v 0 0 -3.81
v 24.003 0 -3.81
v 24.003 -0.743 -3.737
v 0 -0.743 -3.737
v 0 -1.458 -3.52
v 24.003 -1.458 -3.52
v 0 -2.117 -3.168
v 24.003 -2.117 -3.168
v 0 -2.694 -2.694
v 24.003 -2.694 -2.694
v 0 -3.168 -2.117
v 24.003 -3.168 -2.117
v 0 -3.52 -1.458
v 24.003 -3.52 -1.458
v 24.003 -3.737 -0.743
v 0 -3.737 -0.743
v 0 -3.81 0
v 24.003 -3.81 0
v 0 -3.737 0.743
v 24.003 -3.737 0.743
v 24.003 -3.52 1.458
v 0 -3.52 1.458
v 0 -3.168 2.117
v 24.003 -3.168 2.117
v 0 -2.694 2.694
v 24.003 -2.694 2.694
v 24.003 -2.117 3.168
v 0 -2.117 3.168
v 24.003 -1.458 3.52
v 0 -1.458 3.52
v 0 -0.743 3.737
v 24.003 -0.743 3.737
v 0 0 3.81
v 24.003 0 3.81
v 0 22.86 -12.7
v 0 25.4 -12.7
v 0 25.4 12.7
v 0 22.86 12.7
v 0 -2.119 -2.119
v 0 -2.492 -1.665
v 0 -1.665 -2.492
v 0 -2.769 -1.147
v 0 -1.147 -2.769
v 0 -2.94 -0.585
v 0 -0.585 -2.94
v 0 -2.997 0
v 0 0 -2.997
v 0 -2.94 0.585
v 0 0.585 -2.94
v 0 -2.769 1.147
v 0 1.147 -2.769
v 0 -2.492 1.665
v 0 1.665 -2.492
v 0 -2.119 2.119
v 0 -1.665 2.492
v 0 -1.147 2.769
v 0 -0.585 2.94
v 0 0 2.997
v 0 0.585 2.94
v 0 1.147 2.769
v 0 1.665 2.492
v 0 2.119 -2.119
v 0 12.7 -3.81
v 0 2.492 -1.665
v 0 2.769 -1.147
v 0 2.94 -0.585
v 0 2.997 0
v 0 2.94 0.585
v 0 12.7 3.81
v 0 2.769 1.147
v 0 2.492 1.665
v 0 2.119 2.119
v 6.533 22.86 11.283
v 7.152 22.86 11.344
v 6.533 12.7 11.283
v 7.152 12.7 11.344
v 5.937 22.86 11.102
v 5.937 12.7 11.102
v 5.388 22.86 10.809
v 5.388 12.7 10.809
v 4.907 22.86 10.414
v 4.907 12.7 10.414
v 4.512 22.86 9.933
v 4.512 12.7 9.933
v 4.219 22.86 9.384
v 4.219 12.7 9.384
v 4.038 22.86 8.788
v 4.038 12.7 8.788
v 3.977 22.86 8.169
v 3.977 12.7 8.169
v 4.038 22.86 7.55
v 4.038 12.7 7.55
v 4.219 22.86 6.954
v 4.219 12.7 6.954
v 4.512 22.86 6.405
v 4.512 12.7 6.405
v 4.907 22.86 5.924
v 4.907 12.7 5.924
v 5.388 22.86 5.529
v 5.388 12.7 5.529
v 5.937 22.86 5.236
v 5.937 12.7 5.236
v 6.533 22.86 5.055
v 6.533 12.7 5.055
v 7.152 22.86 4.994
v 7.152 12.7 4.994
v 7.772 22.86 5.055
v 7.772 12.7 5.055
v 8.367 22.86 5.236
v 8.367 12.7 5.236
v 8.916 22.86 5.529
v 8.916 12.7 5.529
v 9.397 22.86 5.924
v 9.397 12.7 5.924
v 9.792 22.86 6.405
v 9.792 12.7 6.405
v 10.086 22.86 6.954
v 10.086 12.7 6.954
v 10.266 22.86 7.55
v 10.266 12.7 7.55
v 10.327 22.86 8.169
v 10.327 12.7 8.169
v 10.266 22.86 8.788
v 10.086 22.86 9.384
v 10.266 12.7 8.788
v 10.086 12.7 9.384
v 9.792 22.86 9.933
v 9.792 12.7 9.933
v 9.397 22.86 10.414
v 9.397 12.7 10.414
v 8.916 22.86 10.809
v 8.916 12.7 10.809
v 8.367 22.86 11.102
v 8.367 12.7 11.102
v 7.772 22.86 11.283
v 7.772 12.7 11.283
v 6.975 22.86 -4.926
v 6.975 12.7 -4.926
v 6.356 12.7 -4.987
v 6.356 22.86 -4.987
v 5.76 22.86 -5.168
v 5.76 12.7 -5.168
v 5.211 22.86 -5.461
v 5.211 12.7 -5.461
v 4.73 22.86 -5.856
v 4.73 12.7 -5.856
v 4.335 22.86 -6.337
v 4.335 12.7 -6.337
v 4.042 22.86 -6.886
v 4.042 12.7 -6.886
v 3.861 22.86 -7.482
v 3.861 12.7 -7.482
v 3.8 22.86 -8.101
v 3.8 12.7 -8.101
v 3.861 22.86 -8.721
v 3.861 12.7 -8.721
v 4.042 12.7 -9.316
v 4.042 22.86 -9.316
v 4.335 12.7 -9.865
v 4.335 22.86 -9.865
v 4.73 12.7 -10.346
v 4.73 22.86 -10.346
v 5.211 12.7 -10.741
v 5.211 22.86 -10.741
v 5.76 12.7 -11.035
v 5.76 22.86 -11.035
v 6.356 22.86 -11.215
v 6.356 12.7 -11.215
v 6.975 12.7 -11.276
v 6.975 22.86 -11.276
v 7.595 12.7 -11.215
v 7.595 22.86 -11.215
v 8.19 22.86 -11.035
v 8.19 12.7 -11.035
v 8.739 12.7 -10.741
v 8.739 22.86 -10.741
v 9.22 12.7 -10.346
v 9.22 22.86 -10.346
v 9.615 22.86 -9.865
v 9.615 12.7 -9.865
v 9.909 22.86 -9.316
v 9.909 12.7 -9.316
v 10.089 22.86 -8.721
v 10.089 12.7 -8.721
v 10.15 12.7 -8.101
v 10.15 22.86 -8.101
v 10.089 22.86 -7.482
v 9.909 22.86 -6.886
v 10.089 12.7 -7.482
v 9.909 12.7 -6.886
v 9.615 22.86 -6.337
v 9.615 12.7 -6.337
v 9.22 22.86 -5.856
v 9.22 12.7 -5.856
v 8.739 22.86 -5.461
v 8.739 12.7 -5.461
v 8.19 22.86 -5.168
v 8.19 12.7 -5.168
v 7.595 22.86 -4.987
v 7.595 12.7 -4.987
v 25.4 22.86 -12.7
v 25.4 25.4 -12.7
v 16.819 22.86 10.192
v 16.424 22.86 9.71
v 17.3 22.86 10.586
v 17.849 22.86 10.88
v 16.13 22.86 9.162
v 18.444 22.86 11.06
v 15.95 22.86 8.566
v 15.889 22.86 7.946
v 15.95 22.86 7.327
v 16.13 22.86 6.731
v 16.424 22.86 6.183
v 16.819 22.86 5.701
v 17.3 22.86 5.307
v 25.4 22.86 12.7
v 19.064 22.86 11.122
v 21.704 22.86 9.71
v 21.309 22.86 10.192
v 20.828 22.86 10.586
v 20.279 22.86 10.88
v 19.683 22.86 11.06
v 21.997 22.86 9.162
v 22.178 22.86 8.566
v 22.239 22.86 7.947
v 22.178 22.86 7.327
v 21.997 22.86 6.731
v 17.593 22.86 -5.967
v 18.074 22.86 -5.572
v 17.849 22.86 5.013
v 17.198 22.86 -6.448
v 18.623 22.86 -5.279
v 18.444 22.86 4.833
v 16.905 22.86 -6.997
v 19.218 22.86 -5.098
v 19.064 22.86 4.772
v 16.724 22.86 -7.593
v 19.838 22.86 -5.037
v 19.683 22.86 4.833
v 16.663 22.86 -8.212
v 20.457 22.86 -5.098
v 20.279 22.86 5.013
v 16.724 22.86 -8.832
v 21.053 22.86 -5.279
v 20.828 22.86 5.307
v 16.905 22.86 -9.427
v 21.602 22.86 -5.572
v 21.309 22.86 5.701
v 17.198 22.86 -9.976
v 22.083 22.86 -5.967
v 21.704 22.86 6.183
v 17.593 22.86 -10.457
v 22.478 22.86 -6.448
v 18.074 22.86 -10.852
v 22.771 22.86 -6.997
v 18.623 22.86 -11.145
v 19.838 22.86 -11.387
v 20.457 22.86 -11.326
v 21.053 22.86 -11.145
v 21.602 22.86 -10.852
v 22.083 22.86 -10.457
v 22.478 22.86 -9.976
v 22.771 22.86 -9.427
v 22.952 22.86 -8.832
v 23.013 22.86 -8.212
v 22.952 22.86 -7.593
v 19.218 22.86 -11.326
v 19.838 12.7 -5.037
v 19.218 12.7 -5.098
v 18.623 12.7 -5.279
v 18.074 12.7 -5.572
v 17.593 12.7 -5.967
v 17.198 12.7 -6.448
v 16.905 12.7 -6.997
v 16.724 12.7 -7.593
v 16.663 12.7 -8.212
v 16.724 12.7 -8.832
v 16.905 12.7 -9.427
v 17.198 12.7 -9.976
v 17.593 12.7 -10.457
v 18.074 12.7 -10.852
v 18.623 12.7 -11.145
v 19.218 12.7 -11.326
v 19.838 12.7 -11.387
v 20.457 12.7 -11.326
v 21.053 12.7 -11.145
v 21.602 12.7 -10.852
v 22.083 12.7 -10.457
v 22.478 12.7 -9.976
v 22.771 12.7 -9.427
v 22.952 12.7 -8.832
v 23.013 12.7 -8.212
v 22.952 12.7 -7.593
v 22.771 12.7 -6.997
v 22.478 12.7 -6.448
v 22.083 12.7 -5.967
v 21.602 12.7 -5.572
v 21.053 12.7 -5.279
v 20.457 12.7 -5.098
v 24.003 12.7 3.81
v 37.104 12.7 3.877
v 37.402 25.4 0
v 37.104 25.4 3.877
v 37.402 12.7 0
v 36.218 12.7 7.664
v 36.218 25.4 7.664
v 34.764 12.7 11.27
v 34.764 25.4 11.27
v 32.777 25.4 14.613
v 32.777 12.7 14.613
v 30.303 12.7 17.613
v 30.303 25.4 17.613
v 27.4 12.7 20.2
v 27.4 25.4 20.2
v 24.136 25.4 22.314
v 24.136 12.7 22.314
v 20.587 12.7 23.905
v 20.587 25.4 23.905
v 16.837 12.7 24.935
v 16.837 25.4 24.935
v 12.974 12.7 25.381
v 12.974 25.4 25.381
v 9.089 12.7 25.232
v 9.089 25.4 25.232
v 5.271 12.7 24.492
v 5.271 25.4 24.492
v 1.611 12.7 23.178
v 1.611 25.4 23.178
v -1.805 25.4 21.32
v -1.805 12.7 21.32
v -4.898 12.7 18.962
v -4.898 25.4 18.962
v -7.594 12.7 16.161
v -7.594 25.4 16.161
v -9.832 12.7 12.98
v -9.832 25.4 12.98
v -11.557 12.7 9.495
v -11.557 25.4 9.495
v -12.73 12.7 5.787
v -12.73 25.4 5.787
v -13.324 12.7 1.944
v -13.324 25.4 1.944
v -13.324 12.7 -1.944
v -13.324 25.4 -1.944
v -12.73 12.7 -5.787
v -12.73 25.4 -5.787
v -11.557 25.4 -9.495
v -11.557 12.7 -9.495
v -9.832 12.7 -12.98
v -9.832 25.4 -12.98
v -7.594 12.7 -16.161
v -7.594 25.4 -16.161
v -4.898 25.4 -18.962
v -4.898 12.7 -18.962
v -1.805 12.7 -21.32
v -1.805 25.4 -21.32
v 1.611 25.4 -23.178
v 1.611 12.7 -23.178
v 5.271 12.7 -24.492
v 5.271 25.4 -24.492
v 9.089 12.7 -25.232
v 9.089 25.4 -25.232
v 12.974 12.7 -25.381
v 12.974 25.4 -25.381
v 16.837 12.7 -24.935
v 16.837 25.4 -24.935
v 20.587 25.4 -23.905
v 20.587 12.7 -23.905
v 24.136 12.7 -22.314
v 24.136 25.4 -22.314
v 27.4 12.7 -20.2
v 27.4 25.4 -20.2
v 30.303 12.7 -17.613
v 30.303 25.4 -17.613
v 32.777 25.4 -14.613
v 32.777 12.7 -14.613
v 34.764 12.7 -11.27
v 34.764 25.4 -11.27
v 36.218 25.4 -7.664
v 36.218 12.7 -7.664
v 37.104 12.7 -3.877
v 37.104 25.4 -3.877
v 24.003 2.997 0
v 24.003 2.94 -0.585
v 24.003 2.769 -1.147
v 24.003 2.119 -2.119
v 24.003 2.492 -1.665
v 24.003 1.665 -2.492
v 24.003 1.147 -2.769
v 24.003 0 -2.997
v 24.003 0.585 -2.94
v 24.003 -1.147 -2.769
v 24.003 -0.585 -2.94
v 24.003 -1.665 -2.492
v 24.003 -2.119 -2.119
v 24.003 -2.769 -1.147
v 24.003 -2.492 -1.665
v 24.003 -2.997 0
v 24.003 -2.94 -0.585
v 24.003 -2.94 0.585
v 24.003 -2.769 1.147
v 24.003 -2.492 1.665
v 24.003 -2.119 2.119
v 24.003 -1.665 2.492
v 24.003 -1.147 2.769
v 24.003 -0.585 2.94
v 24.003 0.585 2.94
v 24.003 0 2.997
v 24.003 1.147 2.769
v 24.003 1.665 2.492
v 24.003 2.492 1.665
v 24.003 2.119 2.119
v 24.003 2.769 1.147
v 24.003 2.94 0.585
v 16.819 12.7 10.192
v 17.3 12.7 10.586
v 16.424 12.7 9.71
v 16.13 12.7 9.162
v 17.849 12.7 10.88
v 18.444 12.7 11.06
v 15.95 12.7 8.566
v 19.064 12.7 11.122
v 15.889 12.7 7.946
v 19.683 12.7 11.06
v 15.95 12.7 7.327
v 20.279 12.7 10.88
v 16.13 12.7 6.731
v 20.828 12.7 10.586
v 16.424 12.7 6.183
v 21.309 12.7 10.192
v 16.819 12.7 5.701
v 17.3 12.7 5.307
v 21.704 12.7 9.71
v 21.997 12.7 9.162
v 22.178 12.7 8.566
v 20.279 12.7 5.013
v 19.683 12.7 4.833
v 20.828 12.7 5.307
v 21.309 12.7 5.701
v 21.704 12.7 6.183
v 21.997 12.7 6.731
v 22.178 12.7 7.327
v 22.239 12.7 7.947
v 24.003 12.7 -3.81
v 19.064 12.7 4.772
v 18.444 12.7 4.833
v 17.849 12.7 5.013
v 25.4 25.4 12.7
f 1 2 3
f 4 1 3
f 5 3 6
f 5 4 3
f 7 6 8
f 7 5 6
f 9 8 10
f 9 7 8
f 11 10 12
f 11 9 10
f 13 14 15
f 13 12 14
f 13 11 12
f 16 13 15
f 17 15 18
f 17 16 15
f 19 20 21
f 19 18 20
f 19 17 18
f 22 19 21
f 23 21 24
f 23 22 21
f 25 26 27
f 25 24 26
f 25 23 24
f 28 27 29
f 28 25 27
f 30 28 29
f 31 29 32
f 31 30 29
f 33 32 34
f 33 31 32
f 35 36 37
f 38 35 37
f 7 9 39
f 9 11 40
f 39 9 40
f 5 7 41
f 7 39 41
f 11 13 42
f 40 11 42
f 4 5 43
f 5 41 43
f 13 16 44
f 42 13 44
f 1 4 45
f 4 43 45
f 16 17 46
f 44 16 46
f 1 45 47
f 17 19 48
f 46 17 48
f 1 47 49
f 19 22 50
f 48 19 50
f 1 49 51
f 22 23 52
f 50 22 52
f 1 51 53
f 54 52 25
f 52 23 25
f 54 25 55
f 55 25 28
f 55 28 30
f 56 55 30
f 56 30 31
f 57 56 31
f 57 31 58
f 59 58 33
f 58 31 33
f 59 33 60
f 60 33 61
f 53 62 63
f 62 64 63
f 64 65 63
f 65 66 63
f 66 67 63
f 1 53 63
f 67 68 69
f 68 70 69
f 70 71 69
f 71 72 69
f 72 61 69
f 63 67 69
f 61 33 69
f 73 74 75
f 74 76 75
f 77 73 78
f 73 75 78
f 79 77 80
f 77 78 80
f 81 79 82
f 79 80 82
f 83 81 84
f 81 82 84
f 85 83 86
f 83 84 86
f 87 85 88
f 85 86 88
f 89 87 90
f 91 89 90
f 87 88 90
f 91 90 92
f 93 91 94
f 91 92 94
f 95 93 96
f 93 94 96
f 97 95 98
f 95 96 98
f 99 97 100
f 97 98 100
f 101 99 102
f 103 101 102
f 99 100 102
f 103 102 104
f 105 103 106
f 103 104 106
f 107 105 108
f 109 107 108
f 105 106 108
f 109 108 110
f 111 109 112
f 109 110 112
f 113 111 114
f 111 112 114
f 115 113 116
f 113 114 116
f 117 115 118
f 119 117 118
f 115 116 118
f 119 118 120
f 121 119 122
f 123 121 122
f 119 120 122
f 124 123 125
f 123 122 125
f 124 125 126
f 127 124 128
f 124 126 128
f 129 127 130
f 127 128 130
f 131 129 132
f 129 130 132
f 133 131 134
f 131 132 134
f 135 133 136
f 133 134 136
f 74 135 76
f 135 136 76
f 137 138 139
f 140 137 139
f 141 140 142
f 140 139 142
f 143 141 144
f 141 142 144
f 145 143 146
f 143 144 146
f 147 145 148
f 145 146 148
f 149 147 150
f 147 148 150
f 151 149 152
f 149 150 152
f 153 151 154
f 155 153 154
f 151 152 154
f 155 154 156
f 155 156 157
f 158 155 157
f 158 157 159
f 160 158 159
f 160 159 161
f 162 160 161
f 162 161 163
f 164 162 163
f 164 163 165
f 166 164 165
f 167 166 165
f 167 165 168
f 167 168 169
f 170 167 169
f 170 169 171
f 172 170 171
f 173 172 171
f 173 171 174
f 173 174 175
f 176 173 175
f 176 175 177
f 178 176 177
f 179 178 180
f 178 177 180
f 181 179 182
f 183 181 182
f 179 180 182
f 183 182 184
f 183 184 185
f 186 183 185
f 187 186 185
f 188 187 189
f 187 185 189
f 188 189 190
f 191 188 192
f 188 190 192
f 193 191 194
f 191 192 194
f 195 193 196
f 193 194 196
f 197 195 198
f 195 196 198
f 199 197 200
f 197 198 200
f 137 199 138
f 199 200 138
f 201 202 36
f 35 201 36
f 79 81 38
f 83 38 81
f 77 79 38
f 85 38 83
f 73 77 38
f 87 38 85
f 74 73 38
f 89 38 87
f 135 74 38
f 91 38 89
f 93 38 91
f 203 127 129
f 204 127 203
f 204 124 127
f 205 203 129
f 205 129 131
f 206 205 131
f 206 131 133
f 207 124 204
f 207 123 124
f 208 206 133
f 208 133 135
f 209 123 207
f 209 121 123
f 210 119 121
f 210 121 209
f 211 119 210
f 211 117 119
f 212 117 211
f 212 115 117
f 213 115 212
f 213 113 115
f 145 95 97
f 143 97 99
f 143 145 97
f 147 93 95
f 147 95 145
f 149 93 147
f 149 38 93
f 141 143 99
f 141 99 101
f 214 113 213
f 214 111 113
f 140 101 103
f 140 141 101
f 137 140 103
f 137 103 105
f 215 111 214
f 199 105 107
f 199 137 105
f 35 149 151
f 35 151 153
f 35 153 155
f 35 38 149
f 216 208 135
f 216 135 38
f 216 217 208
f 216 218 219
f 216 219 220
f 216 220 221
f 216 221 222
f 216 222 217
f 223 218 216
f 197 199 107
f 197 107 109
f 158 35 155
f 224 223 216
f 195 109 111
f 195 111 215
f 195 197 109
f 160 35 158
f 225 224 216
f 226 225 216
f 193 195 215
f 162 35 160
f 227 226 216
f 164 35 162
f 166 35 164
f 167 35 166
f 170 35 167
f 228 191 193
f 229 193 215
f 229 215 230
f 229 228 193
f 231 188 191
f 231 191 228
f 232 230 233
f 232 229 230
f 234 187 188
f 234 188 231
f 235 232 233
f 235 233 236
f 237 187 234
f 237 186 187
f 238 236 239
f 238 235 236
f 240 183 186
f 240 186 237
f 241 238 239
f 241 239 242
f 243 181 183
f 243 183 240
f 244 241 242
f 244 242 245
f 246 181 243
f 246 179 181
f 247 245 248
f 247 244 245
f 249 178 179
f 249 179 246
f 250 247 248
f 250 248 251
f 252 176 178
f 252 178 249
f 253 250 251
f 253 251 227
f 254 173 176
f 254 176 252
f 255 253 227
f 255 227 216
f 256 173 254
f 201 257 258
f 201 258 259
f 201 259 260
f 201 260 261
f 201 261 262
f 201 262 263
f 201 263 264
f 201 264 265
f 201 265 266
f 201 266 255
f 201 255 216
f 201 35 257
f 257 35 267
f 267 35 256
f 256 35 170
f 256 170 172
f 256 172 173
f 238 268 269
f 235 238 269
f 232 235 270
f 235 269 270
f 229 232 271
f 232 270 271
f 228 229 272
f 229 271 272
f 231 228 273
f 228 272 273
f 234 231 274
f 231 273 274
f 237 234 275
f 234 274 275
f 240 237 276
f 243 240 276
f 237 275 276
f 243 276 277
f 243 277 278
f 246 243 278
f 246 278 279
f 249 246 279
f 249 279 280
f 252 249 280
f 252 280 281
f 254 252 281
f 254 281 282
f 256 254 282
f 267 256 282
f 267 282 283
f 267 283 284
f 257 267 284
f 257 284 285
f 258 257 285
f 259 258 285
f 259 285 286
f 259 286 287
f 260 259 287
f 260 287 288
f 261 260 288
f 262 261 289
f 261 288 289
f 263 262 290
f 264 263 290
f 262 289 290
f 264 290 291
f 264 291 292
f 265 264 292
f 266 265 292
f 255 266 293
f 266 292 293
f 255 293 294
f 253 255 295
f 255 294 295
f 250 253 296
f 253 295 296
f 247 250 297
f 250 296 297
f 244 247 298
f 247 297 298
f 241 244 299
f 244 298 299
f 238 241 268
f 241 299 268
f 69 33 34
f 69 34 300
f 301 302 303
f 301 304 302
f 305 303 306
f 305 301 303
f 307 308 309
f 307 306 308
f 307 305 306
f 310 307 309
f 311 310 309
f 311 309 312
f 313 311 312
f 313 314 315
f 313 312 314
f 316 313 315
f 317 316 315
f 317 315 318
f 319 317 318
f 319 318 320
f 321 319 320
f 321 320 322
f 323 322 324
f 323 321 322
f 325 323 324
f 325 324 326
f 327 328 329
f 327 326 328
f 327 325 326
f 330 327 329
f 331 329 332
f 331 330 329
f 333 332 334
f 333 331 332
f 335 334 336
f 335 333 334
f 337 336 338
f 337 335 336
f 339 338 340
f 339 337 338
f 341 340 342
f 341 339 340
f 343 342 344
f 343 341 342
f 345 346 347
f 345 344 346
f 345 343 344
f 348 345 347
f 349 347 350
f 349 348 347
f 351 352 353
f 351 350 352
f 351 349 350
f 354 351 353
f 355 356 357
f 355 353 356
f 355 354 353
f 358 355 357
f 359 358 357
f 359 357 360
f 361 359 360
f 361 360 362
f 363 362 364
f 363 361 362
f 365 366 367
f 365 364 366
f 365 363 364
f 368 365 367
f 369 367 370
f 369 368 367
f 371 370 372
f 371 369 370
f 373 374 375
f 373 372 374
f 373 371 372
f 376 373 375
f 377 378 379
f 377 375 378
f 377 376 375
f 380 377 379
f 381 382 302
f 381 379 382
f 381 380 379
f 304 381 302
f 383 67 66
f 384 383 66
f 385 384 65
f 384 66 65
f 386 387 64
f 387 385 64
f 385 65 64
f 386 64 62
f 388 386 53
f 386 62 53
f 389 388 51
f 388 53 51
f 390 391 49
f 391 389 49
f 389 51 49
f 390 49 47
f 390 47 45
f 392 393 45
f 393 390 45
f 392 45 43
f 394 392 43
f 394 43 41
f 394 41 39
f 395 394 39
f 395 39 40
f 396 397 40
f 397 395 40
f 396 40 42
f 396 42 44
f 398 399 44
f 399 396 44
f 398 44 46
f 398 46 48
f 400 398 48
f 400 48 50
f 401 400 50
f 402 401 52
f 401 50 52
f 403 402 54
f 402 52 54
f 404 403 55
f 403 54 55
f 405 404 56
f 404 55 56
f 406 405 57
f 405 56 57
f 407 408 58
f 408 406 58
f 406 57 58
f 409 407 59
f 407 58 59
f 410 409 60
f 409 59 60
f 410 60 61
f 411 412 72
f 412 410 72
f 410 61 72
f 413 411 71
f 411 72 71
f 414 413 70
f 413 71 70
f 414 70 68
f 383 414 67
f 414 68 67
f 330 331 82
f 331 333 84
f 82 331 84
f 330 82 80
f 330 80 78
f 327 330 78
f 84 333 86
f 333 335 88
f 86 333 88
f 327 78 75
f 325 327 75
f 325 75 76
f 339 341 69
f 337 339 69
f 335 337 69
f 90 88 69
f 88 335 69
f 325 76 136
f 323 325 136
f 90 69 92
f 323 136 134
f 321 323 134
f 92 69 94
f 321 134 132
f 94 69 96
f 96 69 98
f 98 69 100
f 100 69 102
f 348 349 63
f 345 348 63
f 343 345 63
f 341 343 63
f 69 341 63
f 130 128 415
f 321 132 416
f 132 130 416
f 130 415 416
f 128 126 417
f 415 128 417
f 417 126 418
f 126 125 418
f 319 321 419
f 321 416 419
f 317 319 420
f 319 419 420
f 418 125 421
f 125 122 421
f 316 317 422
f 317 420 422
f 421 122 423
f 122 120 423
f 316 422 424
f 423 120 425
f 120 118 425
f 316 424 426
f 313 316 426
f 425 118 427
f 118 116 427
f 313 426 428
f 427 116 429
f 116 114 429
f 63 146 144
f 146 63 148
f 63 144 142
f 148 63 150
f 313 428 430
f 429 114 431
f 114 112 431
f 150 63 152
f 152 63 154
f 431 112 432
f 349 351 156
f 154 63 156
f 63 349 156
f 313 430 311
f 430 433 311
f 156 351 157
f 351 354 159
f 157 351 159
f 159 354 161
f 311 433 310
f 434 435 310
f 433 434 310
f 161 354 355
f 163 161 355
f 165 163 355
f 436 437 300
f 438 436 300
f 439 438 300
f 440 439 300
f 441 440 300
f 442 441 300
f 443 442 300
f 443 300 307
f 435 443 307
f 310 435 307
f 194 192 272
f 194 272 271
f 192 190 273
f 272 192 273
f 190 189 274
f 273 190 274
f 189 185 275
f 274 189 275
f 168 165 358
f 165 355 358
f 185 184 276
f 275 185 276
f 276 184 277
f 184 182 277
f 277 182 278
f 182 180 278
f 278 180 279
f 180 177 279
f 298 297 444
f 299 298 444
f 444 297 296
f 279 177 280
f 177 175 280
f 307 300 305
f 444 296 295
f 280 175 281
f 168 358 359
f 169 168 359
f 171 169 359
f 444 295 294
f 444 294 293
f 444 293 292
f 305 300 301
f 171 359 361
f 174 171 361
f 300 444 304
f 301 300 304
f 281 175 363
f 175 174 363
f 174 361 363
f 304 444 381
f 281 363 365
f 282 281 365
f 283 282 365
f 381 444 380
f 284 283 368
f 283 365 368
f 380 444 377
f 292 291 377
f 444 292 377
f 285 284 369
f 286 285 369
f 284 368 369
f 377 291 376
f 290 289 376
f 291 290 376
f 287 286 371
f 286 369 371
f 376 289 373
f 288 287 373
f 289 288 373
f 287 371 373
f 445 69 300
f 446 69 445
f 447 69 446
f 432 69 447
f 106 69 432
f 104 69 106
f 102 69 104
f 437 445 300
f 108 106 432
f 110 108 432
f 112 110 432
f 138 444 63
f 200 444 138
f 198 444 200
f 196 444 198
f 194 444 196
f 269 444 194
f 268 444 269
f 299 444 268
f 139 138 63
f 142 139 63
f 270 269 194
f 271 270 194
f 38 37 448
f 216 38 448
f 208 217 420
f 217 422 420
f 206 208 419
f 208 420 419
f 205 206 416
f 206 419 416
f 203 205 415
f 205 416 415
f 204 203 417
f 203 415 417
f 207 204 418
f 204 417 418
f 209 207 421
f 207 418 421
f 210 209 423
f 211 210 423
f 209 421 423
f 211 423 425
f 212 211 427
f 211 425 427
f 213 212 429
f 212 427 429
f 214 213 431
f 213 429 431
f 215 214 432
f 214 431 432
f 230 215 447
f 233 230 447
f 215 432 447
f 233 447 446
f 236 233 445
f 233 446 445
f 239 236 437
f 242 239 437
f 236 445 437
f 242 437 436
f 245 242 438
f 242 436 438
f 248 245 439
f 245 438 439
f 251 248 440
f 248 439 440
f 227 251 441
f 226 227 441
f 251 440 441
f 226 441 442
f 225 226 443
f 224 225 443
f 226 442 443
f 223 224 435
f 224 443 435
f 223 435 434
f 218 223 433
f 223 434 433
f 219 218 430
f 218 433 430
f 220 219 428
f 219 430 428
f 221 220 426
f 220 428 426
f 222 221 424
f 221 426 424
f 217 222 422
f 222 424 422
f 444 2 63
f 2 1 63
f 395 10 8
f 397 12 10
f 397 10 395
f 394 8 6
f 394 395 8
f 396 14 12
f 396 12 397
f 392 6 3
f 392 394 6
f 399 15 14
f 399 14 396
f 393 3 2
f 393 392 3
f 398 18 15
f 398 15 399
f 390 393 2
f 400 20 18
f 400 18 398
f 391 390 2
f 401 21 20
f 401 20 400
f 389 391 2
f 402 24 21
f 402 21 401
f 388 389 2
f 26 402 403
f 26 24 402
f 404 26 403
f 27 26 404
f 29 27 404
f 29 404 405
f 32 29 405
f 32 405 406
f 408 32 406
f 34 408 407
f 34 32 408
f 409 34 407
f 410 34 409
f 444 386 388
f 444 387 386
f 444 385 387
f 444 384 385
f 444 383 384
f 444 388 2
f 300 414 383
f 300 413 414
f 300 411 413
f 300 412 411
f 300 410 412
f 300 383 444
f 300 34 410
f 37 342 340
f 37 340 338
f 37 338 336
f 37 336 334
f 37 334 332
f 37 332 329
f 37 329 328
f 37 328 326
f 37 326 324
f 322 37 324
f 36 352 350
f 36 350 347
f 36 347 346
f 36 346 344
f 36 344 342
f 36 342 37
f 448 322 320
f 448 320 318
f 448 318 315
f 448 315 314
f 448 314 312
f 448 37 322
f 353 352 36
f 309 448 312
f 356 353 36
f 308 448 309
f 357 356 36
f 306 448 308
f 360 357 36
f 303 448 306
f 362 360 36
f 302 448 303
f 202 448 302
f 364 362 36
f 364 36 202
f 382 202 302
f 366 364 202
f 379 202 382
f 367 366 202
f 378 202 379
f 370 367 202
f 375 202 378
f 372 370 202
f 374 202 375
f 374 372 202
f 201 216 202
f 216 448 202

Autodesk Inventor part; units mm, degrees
ref_plane "YZ Plane" through (0, 0, 0) normal (1, 0, 0) x (0, 1, 0)
ref_plane "XZ Plane" through (0, 0, 0) normal (0, 1, 0) x (-1, 0, 0)
ref_plane "XY Plane" through (0, 0, 0) normal (0, 0, 1) x (1, 0, 0)
sketch "Sketch1" plane through (0, 0, 0) normal (1, 0, 0) x (0, 1, 0)
  circle A0 centre (0, 0) radius 2.9972
  arc A1 (0, 3.81) -> (0, -3.81) centre (0, 0) ccw
  line L0 (0, 3.81) -> (12.7, 3.81)
  line L1 (0, -3.81) -> (12.7, -3.81)
  line L2 (12.7, -3.81) -> (12.7, 3.81)
  dimension "d0" = 5.9944
  dimension "d4" = 7.62
  dimension "d5" = 12.7
  dimension "d6" = 12.7
extrude "Extrusion1" add sketch "Sketch1" along normal blind 24.003
sketch "Sketch2" plane through (0, 12.7, 3.81) normal (0, 1, 0) x (1, 0, 0)
  line L0 (0, 7.62) -> (24.003, 7.62) projected
  circle A0 centre (12.0015, 3.81) radius 25.4
  point P0 (0, 3.81)
  dimension "d9" = 50.8
extrude "Extrusion2" add sketch "Sketch2" along normal blind 12.7
sketch "Sketch3" plane through (12.0015, 25.4, 0) normal (0, 1, 0) x (1, 0, 0)
  line L0 (-12.0015, 2.9972) -> (-12.0015, -2.9972) projected
  line L1 (-12.0015, -12.7) -> (-12.0015, 12.7)
  line L2 (-12.0015, -12.7) -> (13.3985, -12.7)
  line L3 (13.3985, -12.7) -> (13.3985, 12.7)
  line L4 (13.3985, 12.7) -> (-12.0015, 12.7)
  line L5 (-12.0015, 12.7) -> (-12.0015, -12.7)
  circle A0 centre (-5.6515, -8.128) radius 1.905
  line L6 (13.3985, -12.7) -> (13.3985, -8.128)
  line L7 (13.3985, -12.7) -> (13.3985, -8.128)
  line L8 (13.3985, -12.7) -> (13.3985, -8.128)
  circle A1 centre (7.0485, -8.128) radius 1.905
  circle A2 centre (-5.6515, 8.128) radius 1.905
  circle A3 centre (7.0485, 8.128) radius 1.905
  circle A4 centre (-5.6515, -8.128) radius 1.905
  circle A5 centre (7.0485, -8.128) radius 1.905
  point P0 (-12.0015, 0)
  dimension "d13" = 25.4
  dimension "d14" = 25.4
  dimension "d17" = 3.81
  dimension "d20" = 3.81
  dimension "d23" = 3.81
  dimension "d24" = 3.81
  dimension "d25" = 3.81
  dimension "d26" = 3.81
extrude "Extrusion3" cut sketch "Sketch3" against normal blind 2.54
sketch "Sketch4" plane through (6.35, 25.4, 8.128) normal (0, 1, 0) x (1, 0, 0)
  point P0 (-6.35, 8.128)
  point P1 (0.8022, -0.041)
hole "Hole1" at (7.1522, 25.4, 8.169) direction (0, -1, 0) diameter 6.35 end through all
sketch "Sketch5" plane through (6.35, 25.4, -8.128) normal (0, 1, 0) x (1, 0, 0)
  point P0 (-6.35, -8.128)
  point P1 (0.6252, -0.0267)
  point P2 (13.4879, 0.0841)
  point P3 (12.7137, -16.0745)
hole "Hole2" at (6.9752, 25.4, -8.1013) at (19.8379, 25.4, -8.2121) at (19.0637, 25.4, 7.9465) direction (0, -1, 0) diameter 6.35 end through all
properties part number "shaft_mount_wrist"
